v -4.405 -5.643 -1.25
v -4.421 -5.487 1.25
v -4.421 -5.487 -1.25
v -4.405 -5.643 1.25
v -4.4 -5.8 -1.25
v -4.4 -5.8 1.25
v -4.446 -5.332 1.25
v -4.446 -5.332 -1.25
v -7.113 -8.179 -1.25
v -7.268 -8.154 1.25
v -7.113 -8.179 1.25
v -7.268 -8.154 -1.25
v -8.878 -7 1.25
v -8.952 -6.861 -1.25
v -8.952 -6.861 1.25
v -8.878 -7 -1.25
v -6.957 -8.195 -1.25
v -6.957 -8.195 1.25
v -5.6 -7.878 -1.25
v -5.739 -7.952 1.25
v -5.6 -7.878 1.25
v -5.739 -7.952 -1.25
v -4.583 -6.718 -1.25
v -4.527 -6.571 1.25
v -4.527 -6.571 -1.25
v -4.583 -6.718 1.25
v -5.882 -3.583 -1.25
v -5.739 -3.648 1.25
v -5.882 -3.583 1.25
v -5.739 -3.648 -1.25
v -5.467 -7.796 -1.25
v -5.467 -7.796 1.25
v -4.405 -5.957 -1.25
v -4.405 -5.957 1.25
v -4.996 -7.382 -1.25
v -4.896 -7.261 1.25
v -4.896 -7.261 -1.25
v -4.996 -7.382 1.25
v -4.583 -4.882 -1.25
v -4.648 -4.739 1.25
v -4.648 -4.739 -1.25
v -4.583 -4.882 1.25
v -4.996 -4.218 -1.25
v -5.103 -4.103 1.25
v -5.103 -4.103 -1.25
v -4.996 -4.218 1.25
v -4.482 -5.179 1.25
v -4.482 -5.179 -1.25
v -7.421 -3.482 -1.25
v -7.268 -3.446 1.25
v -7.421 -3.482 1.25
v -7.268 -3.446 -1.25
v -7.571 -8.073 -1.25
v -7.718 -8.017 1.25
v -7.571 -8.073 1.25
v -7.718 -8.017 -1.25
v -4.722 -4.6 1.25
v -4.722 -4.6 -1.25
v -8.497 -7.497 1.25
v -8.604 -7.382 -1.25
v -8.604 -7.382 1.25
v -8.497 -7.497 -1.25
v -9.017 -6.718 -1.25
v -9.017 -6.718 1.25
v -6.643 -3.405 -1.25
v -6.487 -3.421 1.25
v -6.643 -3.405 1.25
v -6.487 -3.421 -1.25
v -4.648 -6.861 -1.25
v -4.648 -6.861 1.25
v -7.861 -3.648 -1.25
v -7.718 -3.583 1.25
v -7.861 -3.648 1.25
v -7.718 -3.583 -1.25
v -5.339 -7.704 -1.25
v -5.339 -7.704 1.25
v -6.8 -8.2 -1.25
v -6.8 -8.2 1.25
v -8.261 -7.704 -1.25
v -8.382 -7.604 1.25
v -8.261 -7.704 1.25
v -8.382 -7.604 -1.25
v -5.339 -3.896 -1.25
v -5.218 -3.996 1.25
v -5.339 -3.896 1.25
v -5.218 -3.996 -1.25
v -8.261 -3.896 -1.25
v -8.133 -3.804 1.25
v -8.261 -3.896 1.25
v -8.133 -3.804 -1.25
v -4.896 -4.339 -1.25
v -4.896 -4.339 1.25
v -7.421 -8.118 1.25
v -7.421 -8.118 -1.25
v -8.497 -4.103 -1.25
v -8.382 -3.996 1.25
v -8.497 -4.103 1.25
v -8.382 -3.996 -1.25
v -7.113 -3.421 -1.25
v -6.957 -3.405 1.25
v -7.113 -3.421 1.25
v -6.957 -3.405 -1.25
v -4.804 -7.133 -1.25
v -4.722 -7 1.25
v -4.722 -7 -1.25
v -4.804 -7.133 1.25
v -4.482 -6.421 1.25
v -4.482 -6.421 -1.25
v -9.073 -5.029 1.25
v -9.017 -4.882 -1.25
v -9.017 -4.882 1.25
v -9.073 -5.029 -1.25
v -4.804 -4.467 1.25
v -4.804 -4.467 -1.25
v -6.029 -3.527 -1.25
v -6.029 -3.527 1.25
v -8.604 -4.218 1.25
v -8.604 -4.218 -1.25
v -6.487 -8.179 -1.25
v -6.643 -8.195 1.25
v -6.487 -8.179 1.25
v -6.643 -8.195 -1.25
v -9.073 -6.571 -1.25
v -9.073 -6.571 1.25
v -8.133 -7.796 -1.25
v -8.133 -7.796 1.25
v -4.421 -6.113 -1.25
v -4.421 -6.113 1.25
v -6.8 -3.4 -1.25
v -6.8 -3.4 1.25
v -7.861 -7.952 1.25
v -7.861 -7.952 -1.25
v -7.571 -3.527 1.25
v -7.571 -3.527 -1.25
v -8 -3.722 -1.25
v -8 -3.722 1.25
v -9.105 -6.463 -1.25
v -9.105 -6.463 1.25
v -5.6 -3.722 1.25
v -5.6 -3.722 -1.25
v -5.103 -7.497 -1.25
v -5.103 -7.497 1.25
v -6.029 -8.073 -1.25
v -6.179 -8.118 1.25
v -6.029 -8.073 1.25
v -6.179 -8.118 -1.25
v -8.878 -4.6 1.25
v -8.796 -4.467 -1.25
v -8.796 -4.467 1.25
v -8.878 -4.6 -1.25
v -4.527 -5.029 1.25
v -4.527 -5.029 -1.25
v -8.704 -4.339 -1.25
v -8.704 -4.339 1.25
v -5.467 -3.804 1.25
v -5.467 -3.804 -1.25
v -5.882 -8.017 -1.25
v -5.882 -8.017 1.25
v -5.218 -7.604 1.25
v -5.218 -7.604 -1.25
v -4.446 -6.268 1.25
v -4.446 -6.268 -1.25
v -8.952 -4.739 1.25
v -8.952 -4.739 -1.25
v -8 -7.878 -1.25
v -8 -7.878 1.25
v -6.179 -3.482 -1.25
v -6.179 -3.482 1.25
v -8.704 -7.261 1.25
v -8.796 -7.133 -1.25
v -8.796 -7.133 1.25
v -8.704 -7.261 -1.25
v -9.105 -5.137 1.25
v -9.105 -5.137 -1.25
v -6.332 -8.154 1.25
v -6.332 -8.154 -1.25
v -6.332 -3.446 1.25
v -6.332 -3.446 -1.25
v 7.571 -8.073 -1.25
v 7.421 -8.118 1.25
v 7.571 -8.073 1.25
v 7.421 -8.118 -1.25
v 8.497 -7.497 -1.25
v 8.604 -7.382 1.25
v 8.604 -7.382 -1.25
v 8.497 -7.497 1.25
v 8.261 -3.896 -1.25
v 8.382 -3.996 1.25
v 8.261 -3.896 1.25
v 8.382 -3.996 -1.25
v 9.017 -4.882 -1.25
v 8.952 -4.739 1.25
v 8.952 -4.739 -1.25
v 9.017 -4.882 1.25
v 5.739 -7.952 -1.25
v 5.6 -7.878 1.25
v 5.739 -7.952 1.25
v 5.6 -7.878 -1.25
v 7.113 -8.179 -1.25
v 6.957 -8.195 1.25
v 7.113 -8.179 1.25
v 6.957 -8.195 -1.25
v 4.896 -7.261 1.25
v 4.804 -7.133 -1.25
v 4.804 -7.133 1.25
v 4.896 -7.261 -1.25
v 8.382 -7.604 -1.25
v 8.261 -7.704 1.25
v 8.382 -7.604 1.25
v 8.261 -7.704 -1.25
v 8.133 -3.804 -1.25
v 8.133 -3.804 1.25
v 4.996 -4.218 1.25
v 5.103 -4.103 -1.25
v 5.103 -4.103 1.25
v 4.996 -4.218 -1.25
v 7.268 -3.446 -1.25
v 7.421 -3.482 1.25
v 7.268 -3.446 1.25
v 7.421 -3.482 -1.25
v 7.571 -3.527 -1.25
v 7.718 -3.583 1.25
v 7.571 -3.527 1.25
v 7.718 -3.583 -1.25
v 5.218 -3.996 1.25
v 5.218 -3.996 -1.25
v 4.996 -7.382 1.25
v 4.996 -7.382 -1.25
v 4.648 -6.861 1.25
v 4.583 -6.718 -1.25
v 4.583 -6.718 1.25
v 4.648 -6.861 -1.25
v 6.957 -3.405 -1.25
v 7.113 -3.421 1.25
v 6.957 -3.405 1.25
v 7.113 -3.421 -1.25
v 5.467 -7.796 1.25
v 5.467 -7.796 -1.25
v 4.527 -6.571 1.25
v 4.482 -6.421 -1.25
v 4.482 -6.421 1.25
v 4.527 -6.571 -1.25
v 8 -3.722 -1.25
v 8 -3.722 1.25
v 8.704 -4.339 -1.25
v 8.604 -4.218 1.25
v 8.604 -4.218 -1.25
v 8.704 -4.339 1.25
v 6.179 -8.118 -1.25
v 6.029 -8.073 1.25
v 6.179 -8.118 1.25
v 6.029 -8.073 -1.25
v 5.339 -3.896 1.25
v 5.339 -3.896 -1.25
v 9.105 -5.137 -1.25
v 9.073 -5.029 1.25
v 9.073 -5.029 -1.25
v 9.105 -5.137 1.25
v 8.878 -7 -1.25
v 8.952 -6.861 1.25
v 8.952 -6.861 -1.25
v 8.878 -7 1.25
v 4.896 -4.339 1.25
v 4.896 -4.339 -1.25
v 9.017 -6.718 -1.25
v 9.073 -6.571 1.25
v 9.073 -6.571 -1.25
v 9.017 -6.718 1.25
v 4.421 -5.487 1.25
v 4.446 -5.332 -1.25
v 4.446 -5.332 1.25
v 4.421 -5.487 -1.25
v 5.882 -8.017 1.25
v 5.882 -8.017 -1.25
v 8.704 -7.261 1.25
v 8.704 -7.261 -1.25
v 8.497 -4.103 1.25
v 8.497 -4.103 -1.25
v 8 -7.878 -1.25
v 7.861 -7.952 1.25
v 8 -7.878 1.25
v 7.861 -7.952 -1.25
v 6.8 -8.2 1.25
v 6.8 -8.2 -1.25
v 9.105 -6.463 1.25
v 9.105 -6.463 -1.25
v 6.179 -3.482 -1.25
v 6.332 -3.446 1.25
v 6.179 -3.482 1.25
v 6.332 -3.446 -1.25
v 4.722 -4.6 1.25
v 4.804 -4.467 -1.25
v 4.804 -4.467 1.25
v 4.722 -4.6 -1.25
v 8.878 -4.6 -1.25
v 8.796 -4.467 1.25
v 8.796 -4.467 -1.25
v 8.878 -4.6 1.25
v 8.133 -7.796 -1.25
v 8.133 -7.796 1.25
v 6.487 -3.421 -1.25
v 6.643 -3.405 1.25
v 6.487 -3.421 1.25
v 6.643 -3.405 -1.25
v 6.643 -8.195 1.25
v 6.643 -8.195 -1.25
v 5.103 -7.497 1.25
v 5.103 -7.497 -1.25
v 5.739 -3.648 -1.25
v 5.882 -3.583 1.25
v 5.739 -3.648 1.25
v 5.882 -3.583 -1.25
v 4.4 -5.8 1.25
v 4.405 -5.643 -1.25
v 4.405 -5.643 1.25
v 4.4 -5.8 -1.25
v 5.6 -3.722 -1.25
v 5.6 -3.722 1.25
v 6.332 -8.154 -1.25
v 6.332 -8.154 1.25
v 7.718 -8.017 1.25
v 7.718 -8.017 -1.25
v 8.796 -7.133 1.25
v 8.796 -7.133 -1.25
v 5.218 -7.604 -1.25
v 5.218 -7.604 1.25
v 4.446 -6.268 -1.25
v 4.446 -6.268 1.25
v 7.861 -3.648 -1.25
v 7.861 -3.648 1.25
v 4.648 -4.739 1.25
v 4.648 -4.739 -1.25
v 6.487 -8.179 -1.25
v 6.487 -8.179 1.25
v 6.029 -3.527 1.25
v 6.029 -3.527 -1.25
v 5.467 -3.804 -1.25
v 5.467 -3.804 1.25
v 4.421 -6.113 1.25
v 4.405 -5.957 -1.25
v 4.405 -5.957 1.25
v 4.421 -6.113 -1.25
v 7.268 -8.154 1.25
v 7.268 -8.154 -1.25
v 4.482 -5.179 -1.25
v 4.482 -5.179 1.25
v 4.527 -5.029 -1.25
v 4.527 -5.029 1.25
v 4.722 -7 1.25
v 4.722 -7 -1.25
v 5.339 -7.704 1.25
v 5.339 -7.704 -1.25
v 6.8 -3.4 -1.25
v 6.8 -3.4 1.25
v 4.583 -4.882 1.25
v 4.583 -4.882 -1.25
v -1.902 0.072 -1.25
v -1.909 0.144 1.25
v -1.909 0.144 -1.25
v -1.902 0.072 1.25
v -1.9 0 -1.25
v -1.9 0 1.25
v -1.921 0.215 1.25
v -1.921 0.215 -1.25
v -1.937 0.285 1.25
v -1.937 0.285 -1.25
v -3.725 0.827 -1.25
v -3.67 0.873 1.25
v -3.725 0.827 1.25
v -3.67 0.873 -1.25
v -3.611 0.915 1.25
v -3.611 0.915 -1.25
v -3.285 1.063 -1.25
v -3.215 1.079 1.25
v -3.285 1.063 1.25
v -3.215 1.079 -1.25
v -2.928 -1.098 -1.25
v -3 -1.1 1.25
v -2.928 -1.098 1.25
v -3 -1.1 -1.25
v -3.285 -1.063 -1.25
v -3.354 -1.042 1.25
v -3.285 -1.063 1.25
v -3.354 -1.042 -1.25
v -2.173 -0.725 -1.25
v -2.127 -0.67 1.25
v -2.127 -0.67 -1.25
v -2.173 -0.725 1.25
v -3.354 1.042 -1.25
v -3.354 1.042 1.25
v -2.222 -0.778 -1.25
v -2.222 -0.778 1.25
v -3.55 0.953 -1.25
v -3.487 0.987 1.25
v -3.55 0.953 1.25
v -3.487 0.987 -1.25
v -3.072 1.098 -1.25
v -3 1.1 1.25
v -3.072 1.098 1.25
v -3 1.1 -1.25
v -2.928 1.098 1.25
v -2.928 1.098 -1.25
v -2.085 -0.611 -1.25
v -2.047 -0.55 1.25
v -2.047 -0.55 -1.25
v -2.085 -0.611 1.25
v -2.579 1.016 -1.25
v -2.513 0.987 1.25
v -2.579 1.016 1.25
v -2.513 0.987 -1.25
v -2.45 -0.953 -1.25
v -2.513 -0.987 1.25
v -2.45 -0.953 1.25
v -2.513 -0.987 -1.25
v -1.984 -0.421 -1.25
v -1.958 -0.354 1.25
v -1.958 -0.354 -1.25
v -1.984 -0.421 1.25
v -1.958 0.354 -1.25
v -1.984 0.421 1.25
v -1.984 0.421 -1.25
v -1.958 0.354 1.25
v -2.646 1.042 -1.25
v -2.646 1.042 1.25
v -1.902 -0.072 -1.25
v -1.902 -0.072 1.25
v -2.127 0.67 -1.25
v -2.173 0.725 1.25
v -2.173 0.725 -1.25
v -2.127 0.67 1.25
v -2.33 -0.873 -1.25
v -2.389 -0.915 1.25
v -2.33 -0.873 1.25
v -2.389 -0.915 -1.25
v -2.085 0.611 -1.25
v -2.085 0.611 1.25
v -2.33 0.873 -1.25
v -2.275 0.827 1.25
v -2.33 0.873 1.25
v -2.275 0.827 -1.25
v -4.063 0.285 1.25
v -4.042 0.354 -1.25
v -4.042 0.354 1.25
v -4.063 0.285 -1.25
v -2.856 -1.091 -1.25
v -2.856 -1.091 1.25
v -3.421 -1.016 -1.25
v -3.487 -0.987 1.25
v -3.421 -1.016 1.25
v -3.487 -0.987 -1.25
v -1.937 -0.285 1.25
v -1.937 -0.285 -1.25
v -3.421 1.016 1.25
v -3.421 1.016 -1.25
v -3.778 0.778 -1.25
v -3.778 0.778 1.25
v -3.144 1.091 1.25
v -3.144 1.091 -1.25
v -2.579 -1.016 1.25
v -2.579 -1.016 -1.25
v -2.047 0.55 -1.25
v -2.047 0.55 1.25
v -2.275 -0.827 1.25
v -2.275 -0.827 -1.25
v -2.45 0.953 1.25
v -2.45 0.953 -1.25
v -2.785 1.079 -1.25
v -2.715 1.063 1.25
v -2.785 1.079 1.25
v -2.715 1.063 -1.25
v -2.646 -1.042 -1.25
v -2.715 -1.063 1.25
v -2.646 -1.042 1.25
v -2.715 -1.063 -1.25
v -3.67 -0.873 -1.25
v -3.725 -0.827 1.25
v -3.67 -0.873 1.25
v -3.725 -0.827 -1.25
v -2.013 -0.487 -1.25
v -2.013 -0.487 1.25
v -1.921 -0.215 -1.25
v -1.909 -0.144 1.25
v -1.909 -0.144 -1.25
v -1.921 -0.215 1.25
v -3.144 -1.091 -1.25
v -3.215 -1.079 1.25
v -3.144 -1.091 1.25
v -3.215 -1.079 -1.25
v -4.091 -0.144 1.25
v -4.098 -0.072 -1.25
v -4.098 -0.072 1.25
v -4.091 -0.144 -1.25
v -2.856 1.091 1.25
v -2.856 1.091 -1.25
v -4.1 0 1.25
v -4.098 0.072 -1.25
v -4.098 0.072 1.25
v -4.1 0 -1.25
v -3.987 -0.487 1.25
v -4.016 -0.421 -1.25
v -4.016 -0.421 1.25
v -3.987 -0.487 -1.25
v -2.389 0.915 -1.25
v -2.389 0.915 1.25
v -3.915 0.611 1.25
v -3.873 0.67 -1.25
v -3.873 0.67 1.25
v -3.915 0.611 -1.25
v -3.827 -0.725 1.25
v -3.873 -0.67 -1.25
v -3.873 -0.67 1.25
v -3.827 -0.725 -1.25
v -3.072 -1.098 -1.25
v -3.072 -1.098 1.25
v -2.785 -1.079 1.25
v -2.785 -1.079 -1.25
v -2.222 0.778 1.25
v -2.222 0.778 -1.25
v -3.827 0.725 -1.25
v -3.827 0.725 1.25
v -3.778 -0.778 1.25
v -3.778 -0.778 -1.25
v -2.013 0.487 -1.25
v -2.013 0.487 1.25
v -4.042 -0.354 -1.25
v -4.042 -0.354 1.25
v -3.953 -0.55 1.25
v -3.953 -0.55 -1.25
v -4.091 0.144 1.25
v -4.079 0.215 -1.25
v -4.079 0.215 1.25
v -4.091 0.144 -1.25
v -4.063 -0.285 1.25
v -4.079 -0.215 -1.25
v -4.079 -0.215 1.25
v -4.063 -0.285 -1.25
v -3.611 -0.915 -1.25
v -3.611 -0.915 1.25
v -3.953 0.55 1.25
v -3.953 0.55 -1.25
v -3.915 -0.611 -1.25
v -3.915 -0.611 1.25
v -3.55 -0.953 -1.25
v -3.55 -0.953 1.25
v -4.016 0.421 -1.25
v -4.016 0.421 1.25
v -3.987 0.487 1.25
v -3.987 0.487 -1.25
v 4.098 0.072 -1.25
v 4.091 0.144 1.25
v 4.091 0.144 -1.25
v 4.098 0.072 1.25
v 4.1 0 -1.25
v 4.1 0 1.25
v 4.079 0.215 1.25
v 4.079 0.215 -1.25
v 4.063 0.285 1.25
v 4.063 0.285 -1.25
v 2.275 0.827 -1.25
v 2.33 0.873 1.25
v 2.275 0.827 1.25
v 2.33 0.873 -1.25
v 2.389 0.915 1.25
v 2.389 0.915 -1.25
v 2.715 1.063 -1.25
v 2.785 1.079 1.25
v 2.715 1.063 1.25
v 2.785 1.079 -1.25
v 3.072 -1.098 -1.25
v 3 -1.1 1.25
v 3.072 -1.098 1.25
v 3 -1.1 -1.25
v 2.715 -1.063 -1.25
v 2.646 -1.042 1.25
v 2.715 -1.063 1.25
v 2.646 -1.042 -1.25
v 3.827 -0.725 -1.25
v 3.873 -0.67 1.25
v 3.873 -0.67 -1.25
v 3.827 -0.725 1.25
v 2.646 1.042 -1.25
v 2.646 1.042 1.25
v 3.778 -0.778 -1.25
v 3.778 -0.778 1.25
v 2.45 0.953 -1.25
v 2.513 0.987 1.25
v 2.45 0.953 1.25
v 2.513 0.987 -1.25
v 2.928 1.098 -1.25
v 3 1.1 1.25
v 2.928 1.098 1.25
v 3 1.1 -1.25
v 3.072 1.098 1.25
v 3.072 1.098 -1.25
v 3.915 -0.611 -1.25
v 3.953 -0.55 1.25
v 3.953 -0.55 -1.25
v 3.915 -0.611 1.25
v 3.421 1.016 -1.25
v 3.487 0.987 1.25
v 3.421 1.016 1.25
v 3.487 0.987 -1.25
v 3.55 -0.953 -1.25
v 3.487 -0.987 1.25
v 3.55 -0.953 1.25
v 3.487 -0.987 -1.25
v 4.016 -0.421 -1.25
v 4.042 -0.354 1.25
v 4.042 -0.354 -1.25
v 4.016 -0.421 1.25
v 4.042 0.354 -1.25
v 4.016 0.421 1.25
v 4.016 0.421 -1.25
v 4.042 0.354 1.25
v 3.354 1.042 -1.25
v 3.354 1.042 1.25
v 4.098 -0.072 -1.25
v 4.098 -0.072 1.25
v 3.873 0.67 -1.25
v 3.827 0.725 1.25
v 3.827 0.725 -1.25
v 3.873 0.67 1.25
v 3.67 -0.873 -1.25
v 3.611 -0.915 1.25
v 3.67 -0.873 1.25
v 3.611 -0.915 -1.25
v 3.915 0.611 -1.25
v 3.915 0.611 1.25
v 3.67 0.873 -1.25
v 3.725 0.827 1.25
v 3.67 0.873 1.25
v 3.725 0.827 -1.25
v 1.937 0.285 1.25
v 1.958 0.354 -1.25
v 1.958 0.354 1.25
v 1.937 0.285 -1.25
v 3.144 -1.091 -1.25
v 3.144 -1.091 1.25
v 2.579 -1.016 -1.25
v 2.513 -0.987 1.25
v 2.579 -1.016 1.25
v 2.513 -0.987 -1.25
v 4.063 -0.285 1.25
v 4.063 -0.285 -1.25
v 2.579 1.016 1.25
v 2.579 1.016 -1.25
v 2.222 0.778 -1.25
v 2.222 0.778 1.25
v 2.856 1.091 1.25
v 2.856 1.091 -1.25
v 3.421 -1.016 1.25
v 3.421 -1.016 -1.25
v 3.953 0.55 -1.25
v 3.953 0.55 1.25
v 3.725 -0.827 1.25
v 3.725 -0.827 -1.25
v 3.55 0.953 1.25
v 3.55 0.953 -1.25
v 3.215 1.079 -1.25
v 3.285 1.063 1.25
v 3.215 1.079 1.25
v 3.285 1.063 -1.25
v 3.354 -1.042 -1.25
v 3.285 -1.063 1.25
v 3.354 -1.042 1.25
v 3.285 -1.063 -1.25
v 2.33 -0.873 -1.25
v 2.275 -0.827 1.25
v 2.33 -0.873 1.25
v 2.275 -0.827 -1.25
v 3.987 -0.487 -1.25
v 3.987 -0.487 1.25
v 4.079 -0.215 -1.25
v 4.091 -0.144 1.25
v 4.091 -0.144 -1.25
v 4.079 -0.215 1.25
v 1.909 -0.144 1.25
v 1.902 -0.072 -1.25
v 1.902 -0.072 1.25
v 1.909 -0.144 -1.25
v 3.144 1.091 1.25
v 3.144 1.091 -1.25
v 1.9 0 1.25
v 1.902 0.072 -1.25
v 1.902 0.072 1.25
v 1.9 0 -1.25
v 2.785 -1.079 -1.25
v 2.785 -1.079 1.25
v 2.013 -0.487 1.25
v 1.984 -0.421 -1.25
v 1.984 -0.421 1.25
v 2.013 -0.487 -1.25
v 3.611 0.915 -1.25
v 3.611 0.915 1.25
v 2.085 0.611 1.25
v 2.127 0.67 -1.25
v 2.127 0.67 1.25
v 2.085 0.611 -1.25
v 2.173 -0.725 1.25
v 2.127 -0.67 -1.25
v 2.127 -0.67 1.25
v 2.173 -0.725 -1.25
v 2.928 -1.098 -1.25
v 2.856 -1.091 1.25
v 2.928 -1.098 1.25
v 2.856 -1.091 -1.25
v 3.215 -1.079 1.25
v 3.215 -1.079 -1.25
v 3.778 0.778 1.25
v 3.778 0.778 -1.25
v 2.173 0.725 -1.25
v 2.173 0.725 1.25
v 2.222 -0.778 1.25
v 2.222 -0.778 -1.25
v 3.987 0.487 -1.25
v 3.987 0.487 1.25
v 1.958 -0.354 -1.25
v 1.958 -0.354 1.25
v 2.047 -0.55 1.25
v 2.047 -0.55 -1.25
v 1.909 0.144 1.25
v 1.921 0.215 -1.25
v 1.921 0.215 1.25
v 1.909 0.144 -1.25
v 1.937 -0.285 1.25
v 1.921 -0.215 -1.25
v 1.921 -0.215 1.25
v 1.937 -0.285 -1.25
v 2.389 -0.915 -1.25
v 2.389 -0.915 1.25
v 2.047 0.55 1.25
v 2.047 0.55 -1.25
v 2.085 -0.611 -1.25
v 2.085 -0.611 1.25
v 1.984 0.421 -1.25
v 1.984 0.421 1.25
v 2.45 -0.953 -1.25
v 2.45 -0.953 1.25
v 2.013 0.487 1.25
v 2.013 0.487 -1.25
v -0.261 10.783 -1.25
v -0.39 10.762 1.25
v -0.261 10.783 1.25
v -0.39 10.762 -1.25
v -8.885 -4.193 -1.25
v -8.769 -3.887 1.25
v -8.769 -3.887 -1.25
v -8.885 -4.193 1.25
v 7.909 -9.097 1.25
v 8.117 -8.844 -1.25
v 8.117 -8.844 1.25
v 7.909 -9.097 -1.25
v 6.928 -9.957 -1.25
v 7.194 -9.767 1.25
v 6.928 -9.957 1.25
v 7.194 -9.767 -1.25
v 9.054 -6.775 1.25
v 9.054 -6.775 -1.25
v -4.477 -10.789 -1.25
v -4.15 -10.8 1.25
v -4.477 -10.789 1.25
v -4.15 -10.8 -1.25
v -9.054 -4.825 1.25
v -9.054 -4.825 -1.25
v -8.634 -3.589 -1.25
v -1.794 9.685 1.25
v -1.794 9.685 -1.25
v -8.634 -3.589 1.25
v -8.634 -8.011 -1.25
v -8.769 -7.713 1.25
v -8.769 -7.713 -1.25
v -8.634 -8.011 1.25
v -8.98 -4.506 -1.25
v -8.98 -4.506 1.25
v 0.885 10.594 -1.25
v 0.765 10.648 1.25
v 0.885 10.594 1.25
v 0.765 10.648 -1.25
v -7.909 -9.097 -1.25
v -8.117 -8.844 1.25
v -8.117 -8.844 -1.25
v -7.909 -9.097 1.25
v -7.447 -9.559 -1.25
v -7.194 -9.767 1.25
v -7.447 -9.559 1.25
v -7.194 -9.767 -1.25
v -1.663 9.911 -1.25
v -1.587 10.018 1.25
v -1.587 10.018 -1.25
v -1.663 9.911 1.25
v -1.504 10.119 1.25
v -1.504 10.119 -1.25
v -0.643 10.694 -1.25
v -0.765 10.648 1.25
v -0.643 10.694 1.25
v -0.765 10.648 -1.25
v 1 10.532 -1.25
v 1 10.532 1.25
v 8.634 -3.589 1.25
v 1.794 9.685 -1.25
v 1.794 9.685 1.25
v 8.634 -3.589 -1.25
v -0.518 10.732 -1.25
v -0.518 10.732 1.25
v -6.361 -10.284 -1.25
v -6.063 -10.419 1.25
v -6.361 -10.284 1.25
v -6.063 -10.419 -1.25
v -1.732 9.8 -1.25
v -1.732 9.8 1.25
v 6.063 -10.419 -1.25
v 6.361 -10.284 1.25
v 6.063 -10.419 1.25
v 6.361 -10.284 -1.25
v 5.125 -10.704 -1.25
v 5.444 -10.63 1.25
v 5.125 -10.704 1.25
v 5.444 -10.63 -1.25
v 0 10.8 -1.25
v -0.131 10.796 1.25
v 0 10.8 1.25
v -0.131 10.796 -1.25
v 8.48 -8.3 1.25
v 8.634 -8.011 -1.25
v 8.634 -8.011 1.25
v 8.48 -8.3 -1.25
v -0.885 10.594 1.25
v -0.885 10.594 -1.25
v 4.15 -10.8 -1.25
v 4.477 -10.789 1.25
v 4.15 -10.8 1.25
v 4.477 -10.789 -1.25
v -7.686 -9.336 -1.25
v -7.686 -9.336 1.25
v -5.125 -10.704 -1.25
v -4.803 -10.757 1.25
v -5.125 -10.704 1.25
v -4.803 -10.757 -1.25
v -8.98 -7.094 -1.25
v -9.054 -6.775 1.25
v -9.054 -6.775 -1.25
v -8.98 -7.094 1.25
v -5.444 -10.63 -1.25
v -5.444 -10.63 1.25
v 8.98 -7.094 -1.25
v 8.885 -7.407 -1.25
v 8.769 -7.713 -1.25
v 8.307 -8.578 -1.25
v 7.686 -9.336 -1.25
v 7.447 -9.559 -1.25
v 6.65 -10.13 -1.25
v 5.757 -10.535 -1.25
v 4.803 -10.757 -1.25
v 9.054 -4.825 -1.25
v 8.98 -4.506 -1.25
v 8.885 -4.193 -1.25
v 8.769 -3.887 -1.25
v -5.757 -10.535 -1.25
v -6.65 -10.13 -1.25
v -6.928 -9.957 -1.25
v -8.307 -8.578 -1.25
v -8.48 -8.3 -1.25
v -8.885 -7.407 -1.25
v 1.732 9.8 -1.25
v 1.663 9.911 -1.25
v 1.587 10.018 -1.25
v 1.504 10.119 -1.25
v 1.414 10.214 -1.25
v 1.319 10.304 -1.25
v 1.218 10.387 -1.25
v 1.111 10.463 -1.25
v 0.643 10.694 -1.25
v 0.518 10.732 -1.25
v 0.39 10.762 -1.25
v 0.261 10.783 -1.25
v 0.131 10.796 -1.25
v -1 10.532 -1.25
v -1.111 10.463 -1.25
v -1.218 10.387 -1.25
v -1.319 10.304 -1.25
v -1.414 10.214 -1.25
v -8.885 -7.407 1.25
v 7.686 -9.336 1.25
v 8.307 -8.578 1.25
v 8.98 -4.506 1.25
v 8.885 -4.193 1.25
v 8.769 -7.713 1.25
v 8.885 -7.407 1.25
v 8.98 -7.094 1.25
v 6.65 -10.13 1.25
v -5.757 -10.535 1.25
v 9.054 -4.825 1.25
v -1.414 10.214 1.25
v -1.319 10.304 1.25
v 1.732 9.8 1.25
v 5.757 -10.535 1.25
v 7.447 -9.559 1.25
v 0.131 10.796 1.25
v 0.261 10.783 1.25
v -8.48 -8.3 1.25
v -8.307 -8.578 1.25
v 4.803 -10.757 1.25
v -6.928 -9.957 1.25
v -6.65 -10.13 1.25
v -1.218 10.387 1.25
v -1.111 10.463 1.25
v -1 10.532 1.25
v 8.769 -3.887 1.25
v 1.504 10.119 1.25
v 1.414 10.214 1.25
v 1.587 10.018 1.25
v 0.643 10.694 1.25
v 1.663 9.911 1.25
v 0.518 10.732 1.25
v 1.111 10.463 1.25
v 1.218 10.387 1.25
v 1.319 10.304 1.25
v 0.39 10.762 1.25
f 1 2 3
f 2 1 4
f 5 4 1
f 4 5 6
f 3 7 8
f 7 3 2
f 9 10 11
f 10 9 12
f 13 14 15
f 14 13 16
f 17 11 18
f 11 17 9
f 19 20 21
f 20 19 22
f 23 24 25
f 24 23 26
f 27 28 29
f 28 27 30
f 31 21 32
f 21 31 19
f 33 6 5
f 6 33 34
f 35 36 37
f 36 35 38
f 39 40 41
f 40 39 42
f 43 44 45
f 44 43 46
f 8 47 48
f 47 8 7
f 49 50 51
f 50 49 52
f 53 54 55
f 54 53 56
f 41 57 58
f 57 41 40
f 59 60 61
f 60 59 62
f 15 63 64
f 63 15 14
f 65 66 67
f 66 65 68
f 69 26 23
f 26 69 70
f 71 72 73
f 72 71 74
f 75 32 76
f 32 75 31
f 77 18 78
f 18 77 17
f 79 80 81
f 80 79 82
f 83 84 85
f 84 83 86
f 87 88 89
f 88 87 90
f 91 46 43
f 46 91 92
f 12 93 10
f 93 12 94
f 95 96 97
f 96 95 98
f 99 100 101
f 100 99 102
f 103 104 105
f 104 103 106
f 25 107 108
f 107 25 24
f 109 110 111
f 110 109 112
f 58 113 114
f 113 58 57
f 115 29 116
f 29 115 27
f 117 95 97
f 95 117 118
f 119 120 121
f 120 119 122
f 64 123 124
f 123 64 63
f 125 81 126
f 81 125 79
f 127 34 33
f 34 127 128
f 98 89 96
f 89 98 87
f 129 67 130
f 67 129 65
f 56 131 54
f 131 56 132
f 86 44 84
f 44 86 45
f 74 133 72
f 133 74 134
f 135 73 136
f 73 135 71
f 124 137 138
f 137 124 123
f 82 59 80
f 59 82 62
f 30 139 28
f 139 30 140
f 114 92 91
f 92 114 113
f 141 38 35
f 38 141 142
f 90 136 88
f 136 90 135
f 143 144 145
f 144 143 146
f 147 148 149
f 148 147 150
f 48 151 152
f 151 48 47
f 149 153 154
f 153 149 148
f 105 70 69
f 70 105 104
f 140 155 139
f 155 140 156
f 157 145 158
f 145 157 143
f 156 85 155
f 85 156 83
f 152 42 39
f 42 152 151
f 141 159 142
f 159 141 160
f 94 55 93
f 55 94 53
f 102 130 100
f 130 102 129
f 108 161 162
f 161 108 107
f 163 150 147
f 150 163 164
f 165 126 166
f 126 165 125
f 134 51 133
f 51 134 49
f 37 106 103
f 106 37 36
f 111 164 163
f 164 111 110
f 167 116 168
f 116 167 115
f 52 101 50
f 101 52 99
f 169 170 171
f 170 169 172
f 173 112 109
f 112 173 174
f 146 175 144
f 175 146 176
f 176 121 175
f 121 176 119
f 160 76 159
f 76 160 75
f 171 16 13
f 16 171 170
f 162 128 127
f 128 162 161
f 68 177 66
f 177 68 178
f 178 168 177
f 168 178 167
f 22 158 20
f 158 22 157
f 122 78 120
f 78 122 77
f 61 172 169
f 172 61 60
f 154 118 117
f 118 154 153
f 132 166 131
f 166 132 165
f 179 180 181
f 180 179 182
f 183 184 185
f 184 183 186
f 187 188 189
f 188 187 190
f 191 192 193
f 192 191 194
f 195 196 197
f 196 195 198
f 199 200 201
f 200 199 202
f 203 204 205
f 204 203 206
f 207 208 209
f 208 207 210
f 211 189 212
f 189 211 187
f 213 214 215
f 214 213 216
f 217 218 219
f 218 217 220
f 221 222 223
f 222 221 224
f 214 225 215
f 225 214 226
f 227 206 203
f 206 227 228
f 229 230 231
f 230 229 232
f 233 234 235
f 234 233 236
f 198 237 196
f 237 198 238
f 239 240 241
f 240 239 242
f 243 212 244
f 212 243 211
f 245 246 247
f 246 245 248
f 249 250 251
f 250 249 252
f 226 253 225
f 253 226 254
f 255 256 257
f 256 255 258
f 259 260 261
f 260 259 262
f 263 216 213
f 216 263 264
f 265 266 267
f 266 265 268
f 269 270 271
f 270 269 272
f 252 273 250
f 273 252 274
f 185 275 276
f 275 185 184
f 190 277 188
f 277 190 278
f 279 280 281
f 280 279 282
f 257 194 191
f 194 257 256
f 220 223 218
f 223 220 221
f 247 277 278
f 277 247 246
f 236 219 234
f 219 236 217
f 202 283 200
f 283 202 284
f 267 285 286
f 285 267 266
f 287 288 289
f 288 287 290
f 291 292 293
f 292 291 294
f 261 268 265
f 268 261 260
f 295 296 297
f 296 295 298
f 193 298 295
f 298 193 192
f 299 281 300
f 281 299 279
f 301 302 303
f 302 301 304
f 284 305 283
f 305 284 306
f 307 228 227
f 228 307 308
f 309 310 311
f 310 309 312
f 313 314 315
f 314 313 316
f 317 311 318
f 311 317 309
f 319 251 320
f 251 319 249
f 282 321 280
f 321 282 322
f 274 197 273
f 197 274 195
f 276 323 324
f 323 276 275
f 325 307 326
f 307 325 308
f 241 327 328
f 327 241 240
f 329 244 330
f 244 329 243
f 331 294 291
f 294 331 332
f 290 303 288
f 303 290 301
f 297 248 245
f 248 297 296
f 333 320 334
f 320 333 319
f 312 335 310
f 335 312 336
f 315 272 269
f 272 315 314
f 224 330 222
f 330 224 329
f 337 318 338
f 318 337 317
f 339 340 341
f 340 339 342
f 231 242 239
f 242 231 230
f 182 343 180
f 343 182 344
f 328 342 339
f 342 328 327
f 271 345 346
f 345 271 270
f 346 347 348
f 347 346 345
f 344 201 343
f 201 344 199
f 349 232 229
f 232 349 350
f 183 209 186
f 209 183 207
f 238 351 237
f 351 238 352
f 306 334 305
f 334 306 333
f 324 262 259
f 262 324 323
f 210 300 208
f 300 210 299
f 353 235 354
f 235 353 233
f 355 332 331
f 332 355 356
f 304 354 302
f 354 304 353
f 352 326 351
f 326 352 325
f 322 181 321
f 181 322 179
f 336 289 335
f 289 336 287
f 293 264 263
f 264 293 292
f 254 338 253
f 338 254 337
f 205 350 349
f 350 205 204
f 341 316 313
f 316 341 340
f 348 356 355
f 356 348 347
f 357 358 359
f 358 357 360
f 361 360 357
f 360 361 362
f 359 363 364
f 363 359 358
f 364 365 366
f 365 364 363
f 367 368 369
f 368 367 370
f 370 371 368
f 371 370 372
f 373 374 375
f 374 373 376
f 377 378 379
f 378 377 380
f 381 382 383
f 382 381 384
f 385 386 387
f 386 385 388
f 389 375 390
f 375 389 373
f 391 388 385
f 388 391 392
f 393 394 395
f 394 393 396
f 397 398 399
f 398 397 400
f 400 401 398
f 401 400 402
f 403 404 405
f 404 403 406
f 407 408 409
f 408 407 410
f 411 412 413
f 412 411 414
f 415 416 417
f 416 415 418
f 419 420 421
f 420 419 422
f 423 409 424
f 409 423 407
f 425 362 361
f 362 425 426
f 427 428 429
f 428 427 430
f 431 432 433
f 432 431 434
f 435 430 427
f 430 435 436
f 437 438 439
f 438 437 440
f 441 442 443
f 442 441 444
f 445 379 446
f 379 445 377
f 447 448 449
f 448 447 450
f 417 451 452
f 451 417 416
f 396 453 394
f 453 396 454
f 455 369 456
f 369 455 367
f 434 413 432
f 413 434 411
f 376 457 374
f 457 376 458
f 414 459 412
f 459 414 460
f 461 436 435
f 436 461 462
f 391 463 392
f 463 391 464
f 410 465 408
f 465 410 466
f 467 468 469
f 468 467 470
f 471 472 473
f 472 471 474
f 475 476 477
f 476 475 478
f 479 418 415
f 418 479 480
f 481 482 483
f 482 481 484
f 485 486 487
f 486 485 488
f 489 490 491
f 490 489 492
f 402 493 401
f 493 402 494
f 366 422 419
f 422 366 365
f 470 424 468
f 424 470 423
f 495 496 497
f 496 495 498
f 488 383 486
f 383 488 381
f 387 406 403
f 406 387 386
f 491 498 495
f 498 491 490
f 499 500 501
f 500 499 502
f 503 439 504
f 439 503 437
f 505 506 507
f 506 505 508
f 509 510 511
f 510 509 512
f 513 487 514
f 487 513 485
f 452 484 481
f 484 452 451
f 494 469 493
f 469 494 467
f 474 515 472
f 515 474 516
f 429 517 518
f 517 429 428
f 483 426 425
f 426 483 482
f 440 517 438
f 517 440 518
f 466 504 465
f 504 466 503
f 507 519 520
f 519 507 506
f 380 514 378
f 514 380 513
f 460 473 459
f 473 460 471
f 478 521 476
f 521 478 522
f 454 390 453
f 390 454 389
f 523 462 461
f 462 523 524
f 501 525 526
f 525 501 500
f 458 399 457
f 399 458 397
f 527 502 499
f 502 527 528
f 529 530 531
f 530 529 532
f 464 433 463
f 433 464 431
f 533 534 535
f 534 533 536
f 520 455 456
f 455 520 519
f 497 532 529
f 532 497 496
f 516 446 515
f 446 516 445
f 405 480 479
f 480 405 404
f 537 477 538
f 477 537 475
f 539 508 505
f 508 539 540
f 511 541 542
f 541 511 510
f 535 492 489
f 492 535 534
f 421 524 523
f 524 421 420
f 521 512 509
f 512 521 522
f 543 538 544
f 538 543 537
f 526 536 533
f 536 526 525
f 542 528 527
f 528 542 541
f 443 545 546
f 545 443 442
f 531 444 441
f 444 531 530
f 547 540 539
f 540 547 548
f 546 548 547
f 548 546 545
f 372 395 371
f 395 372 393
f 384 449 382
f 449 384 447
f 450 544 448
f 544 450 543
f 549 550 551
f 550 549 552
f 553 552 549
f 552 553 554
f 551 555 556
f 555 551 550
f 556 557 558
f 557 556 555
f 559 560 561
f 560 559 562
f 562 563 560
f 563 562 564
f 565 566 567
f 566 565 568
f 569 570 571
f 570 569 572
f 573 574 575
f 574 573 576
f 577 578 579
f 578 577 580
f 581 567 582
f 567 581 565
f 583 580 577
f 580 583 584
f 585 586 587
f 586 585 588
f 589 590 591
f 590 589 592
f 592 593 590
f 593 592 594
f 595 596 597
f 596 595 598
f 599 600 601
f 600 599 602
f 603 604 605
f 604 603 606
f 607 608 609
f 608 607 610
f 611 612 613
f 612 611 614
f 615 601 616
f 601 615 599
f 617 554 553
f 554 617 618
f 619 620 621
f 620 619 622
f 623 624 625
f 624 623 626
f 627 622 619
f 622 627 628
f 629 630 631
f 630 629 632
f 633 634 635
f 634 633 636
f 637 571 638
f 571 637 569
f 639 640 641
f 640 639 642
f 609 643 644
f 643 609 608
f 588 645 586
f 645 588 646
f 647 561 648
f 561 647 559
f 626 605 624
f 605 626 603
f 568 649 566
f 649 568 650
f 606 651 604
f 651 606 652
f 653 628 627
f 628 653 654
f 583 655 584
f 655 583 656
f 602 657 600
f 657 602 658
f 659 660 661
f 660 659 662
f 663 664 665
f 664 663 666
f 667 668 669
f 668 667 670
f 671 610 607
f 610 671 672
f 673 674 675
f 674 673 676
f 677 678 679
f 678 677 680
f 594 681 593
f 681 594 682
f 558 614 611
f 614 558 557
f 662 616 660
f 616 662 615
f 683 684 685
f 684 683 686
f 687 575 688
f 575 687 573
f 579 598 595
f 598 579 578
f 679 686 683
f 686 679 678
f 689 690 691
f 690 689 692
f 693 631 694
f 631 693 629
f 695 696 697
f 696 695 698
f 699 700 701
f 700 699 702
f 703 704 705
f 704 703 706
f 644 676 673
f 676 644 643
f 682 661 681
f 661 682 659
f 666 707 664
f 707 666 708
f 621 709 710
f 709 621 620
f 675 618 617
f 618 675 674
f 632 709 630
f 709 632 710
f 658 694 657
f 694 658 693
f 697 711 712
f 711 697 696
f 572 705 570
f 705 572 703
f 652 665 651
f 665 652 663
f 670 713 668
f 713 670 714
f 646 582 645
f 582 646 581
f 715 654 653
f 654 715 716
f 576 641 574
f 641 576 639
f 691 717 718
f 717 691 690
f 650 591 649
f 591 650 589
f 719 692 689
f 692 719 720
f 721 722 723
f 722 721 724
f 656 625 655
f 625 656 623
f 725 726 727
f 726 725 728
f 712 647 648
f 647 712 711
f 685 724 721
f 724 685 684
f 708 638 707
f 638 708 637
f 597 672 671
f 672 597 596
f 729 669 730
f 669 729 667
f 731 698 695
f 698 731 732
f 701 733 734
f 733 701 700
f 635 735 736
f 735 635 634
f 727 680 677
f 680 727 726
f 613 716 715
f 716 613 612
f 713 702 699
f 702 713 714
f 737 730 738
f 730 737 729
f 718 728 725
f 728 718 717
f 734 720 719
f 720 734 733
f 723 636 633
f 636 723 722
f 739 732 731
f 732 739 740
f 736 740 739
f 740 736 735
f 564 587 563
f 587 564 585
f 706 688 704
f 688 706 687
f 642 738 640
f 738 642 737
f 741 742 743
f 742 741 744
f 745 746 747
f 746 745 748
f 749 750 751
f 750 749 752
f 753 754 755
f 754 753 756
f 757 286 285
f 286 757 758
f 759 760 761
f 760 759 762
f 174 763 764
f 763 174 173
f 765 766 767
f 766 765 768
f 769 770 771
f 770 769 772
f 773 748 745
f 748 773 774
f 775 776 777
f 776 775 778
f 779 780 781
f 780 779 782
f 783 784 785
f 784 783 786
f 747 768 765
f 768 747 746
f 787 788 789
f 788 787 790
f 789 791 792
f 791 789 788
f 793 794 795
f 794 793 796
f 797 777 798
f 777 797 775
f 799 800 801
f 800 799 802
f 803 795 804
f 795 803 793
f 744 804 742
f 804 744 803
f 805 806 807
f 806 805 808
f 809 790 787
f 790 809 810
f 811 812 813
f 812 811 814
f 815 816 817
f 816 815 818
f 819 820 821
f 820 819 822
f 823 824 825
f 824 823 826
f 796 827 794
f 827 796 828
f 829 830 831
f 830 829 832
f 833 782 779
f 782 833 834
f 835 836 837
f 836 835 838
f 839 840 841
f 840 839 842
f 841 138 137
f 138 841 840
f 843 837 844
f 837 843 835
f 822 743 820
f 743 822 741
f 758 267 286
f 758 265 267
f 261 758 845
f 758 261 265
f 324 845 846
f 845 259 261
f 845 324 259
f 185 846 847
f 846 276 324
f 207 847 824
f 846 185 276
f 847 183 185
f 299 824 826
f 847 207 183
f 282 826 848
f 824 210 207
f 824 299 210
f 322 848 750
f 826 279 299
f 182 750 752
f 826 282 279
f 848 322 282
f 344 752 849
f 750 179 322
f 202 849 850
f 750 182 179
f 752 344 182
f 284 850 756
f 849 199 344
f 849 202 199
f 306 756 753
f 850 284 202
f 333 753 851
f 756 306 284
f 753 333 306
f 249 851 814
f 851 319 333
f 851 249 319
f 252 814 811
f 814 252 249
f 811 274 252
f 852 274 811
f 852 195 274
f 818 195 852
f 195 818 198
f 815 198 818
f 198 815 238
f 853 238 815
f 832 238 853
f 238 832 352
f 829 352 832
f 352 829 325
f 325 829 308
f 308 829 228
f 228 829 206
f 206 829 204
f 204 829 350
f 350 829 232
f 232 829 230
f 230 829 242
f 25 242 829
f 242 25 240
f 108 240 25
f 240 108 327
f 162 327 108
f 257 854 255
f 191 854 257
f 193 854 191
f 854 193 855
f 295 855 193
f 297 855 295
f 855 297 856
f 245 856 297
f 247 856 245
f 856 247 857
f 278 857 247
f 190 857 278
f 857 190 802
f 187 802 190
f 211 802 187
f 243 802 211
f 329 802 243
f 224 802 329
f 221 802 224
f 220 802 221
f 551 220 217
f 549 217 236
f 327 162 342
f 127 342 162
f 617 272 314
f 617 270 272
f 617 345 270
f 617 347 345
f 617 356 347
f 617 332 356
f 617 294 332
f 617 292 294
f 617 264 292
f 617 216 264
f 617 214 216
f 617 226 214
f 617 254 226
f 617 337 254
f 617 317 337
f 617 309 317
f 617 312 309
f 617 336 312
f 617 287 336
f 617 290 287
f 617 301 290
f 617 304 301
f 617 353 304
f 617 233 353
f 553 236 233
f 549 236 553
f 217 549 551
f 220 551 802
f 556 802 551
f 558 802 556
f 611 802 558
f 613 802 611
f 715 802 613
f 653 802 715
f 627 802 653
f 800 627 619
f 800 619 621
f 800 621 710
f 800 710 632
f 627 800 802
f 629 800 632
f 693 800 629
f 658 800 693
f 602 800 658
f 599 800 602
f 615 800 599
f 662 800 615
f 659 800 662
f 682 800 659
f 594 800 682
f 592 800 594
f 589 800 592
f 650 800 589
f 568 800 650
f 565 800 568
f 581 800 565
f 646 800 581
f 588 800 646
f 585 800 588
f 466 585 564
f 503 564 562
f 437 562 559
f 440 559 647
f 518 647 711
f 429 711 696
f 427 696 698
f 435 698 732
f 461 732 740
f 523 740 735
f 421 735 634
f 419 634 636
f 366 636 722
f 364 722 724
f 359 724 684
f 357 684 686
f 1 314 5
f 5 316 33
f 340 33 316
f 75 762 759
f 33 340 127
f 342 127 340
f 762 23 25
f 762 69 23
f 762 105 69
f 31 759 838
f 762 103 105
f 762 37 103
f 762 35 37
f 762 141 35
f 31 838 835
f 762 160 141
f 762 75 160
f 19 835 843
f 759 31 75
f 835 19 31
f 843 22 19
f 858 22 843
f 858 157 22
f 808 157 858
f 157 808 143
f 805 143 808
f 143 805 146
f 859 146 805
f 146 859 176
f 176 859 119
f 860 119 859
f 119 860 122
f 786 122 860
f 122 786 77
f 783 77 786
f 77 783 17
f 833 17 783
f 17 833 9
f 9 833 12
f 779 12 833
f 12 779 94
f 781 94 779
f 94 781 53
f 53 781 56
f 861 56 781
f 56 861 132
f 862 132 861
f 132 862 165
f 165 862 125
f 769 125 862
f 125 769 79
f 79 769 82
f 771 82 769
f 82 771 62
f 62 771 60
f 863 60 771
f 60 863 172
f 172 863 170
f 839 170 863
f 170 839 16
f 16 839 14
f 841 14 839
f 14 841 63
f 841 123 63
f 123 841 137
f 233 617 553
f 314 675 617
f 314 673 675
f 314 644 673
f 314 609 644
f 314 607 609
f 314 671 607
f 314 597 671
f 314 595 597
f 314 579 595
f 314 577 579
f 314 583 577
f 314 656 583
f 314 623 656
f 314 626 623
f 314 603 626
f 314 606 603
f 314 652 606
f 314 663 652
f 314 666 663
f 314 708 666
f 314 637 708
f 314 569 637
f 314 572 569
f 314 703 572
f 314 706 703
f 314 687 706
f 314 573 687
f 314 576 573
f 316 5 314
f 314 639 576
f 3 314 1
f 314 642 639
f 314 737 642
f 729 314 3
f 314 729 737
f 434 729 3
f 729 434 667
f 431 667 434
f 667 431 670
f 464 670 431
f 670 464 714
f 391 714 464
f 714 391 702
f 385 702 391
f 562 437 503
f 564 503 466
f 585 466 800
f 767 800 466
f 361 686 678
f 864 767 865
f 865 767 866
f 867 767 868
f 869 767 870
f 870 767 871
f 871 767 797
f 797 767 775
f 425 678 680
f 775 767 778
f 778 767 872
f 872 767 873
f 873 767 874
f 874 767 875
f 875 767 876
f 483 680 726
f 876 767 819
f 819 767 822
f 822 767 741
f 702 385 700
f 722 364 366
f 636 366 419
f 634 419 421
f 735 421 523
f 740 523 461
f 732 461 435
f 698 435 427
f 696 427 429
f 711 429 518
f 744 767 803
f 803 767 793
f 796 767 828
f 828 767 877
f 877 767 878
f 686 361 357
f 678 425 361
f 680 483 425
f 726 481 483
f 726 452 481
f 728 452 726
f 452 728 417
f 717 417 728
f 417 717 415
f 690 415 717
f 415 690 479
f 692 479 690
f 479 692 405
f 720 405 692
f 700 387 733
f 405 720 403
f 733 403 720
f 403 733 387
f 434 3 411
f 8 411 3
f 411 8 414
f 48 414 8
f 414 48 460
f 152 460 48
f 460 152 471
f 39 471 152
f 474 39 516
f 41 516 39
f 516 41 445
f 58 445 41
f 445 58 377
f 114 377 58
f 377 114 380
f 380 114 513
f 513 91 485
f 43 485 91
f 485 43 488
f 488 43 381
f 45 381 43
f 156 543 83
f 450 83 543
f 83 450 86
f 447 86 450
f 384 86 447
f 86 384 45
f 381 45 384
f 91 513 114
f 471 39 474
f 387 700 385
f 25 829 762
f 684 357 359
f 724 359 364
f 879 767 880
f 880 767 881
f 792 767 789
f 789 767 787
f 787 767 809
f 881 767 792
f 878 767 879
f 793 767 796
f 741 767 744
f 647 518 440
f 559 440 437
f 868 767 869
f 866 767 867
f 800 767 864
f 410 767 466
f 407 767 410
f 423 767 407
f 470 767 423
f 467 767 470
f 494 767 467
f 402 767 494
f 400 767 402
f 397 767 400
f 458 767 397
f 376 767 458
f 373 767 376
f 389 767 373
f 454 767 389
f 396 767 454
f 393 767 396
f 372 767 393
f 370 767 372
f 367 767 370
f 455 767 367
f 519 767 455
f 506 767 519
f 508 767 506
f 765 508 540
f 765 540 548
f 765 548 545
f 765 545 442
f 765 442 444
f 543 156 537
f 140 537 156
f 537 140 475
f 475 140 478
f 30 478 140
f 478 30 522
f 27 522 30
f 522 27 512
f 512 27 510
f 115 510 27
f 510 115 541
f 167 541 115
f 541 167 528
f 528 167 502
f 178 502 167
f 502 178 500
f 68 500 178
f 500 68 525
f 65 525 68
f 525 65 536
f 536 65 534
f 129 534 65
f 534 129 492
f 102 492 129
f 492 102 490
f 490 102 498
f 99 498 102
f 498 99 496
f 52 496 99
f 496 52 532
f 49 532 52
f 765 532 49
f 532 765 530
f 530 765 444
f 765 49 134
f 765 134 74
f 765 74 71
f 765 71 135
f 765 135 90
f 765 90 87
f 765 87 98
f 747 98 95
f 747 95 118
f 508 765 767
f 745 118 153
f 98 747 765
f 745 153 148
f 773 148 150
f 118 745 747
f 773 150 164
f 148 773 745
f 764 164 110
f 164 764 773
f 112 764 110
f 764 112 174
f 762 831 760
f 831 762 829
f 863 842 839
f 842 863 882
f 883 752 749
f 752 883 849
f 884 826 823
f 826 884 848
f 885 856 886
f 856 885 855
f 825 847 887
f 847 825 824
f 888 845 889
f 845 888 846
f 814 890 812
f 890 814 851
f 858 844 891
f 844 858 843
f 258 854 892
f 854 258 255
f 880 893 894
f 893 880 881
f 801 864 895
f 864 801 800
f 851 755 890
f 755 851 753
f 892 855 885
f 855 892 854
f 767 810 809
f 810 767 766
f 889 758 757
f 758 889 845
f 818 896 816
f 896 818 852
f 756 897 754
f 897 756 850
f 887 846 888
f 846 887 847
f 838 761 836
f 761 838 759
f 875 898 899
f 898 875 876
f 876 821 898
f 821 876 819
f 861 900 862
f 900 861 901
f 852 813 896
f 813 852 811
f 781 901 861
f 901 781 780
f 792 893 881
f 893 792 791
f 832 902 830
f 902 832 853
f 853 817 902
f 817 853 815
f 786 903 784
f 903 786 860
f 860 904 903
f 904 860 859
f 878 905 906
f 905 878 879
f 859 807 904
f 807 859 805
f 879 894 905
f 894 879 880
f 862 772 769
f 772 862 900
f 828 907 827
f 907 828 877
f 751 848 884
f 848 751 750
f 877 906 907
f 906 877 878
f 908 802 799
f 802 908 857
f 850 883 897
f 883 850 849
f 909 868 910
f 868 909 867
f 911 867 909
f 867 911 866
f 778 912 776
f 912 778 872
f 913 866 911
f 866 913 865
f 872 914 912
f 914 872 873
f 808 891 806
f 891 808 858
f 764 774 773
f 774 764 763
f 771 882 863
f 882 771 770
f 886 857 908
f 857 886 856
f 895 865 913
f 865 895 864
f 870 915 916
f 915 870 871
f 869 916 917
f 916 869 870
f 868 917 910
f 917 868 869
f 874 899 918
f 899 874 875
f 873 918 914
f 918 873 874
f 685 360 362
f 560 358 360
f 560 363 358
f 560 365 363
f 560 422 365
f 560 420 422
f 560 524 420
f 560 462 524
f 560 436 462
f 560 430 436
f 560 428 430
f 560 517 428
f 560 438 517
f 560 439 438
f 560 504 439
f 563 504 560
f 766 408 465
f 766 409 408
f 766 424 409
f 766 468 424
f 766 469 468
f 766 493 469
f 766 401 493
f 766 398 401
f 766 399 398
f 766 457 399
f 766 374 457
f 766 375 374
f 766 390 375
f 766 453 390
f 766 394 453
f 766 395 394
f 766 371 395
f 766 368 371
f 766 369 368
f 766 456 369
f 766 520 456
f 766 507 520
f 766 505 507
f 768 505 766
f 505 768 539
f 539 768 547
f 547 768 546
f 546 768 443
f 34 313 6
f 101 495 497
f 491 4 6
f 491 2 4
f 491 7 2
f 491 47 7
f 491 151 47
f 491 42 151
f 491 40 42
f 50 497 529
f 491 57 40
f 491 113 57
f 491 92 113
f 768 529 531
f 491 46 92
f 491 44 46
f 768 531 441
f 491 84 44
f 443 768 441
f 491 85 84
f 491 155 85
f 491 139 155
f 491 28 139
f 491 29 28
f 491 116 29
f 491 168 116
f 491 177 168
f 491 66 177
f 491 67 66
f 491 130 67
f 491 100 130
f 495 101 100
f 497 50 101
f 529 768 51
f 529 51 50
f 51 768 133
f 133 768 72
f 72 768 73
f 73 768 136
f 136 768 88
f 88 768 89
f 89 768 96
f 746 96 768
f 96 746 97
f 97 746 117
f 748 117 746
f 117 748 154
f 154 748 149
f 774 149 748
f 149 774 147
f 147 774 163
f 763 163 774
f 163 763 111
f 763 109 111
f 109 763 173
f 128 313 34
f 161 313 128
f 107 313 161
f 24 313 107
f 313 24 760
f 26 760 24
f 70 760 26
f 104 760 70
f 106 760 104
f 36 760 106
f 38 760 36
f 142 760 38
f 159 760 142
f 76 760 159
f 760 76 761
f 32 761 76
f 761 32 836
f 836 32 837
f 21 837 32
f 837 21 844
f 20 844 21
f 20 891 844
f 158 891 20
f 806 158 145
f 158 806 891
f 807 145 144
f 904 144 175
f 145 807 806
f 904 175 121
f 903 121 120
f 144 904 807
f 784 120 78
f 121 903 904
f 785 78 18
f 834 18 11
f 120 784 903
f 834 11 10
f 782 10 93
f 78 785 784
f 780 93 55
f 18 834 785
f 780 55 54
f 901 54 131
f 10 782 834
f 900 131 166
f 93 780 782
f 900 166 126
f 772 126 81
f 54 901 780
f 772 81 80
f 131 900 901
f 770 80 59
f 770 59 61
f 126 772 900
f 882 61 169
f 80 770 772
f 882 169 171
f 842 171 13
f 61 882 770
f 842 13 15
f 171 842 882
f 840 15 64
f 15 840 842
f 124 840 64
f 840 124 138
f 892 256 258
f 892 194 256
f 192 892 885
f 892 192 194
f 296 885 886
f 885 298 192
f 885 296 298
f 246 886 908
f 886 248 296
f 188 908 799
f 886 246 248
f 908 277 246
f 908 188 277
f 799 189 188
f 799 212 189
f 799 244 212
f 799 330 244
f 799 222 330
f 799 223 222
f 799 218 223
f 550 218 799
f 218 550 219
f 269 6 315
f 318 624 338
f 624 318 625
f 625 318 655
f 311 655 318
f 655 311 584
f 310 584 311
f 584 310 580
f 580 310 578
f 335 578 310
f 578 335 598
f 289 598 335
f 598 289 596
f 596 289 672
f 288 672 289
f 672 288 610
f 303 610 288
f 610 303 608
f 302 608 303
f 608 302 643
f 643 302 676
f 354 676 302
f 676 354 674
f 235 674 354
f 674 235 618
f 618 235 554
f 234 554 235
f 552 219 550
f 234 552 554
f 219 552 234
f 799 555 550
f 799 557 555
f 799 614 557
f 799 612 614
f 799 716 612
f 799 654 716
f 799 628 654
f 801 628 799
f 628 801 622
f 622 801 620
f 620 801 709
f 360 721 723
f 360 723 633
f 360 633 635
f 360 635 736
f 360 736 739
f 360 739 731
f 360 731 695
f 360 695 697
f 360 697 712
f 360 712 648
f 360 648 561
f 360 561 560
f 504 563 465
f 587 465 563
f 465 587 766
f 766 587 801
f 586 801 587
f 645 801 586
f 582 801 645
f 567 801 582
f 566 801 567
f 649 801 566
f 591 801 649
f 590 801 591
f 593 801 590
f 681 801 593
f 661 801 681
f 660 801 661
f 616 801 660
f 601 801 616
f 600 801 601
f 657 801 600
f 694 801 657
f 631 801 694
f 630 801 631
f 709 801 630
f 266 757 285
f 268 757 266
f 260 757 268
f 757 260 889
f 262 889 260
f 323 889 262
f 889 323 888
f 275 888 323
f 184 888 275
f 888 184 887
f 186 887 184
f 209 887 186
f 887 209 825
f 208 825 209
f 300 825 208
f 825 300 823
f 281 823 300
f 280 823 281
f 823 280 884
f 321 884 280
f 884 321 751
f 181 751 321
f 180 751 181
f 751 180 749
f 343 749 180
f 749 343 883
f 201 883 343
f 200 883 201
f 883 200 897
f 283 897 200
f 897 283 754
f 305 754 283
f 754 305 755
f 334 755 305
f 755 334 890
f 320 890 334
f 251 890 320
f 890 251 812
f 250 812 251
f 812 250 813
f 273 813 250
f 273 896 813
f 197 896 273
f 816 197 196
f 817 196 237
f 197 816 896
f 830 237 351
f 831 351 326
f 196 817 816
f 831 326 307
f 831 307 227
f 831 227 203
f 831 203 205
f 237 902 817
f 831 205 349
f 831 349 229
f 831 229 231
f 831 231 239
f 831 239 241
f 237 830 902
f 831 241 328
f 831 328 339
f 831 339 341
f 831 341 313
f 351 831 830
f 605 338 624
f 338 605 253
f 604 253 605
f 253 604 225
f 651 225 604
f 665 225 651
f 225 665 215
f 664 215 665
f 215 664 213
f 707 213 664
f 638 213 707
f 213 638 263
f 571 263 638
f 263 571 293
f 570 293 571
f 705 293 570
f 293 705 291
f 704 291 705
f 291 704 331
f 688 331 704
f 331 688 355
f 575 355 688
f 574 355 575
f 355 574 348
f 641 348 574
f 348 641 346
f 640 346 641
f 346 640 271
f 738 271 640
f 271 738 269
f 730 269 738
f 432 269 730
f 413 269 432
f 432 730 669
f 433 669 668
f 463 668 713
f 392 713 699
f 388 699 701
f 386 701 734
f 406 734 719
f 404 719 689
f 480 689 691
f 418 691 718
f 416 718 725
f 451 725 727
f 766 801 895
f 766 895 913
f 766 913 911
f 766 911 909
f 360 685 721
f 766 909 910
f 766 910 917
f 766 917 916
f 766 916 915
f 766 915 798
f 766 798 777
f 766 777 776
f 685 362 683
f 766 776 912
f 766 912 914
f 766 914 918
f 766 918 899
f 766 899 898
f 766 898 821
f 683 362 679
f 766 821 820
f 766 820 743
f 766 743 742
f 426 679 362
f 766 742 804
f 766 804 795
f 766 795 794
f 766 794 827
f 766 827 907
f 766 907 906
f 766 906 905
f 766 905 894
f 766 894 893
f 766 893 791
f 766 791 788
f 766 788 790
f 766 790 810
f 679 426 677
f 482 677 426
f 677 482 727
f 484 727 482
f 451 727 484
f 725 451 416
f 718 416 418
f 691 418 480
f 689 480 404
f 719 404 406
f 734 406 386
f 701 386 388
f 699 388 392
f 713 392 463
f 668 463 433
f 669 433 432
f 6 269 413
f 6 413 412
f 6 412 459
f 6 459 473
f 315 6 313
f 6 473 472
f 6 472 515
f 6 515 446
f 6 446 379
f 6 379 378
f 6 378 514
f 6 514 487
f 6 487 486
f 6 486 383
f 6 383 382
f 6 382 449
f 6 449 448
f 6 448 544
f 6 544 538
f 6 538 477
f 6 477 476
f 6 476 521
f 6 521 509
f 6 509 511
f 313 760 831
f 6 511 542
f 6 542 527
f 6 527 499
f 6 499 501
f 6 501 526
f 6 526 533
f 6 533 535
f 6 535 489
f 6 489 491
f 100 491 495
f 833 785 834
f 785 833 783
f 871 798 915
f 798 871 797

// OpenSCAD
// Flat teardrop/triangular mounting plate with two rounded lobes and 4 through-holes
// Target bounding box: 18.3 x 21.6 x 2.5 mm (X x Y x Z)

$fn = 96;

// --- Parameters (mm) ---
bbox_X = 18.3;
bbox_Y = 21.6;
T      = 2.5;

lobe_r = 5.0;          // outer lobe radius (bottom corners)
tip_r  = 2.0;          // rounded tip radius (top)

hole_big_d   = 4.8;
hole_small_d = 2.2;

big_hole_offset_x = 6.8;
big_hole_offset_y = 5.8;

small_hole_spacing_x = 6.0;
small_hole_offset_y  = 0.0;

overlap = 0.2;

// --- Derived geometry to enforce bounding box ---
y_bottom = -bbox_Y/2 + lobe_r;   // lobe centers sit so outer edge hits -bbox_Y/2
y_top    =  bbox_Y/2 - tip_r;    // tip circle center so outer edge hits +bbox_Y/2

// Place lobe centers so outermost X hits +/- bbox_X/2
x_lobe = bbox_X/2 - lobe_r;

// --- 2D outline (teardrop/triangular with two lobes) ---
module outline2d() {
    hull() {
        translate([-x_lobe, y_bottom]) circle(r=lobe_r);
        translate([ x_lobe, y_bottom]) circle(r=lobe_r);
        translate([0,       y_top   ]) circle(r=tip_r);
    }
}

// --- Holes (2 big in lobes, 2 small near center) ---
module holes3d() {
    // Big holes in lobes
    translate([-big_hole_offset_x, -big_hole_offset_y, 0])
        cylinder(d=hole_big_d, h=T + 2*overlap, center=true);
    translate([ big_hole_offset_x, -big_hole_offset_y, 0])
        cylinder(d=hole_big_d, h=T + 2*overlap, center=true);

    // Small holes near center
    translate([-small_hole_spacing_x/2, small_hole_offset_y, 0])
        cylinder(d=hole_small_d, h=T + 2*overlap, center=true);
    translate([ small_hole_spacing_x/2, small_hole_offset_y, 0])
        cylinder(d=hole_small_d, h=T + 2*overlap, center=true);
}

// --- Final solid ---
difference() {
    linear_extrude(height=T, center=true, convexity=10)
        outline2d();
    holes3d();
}
